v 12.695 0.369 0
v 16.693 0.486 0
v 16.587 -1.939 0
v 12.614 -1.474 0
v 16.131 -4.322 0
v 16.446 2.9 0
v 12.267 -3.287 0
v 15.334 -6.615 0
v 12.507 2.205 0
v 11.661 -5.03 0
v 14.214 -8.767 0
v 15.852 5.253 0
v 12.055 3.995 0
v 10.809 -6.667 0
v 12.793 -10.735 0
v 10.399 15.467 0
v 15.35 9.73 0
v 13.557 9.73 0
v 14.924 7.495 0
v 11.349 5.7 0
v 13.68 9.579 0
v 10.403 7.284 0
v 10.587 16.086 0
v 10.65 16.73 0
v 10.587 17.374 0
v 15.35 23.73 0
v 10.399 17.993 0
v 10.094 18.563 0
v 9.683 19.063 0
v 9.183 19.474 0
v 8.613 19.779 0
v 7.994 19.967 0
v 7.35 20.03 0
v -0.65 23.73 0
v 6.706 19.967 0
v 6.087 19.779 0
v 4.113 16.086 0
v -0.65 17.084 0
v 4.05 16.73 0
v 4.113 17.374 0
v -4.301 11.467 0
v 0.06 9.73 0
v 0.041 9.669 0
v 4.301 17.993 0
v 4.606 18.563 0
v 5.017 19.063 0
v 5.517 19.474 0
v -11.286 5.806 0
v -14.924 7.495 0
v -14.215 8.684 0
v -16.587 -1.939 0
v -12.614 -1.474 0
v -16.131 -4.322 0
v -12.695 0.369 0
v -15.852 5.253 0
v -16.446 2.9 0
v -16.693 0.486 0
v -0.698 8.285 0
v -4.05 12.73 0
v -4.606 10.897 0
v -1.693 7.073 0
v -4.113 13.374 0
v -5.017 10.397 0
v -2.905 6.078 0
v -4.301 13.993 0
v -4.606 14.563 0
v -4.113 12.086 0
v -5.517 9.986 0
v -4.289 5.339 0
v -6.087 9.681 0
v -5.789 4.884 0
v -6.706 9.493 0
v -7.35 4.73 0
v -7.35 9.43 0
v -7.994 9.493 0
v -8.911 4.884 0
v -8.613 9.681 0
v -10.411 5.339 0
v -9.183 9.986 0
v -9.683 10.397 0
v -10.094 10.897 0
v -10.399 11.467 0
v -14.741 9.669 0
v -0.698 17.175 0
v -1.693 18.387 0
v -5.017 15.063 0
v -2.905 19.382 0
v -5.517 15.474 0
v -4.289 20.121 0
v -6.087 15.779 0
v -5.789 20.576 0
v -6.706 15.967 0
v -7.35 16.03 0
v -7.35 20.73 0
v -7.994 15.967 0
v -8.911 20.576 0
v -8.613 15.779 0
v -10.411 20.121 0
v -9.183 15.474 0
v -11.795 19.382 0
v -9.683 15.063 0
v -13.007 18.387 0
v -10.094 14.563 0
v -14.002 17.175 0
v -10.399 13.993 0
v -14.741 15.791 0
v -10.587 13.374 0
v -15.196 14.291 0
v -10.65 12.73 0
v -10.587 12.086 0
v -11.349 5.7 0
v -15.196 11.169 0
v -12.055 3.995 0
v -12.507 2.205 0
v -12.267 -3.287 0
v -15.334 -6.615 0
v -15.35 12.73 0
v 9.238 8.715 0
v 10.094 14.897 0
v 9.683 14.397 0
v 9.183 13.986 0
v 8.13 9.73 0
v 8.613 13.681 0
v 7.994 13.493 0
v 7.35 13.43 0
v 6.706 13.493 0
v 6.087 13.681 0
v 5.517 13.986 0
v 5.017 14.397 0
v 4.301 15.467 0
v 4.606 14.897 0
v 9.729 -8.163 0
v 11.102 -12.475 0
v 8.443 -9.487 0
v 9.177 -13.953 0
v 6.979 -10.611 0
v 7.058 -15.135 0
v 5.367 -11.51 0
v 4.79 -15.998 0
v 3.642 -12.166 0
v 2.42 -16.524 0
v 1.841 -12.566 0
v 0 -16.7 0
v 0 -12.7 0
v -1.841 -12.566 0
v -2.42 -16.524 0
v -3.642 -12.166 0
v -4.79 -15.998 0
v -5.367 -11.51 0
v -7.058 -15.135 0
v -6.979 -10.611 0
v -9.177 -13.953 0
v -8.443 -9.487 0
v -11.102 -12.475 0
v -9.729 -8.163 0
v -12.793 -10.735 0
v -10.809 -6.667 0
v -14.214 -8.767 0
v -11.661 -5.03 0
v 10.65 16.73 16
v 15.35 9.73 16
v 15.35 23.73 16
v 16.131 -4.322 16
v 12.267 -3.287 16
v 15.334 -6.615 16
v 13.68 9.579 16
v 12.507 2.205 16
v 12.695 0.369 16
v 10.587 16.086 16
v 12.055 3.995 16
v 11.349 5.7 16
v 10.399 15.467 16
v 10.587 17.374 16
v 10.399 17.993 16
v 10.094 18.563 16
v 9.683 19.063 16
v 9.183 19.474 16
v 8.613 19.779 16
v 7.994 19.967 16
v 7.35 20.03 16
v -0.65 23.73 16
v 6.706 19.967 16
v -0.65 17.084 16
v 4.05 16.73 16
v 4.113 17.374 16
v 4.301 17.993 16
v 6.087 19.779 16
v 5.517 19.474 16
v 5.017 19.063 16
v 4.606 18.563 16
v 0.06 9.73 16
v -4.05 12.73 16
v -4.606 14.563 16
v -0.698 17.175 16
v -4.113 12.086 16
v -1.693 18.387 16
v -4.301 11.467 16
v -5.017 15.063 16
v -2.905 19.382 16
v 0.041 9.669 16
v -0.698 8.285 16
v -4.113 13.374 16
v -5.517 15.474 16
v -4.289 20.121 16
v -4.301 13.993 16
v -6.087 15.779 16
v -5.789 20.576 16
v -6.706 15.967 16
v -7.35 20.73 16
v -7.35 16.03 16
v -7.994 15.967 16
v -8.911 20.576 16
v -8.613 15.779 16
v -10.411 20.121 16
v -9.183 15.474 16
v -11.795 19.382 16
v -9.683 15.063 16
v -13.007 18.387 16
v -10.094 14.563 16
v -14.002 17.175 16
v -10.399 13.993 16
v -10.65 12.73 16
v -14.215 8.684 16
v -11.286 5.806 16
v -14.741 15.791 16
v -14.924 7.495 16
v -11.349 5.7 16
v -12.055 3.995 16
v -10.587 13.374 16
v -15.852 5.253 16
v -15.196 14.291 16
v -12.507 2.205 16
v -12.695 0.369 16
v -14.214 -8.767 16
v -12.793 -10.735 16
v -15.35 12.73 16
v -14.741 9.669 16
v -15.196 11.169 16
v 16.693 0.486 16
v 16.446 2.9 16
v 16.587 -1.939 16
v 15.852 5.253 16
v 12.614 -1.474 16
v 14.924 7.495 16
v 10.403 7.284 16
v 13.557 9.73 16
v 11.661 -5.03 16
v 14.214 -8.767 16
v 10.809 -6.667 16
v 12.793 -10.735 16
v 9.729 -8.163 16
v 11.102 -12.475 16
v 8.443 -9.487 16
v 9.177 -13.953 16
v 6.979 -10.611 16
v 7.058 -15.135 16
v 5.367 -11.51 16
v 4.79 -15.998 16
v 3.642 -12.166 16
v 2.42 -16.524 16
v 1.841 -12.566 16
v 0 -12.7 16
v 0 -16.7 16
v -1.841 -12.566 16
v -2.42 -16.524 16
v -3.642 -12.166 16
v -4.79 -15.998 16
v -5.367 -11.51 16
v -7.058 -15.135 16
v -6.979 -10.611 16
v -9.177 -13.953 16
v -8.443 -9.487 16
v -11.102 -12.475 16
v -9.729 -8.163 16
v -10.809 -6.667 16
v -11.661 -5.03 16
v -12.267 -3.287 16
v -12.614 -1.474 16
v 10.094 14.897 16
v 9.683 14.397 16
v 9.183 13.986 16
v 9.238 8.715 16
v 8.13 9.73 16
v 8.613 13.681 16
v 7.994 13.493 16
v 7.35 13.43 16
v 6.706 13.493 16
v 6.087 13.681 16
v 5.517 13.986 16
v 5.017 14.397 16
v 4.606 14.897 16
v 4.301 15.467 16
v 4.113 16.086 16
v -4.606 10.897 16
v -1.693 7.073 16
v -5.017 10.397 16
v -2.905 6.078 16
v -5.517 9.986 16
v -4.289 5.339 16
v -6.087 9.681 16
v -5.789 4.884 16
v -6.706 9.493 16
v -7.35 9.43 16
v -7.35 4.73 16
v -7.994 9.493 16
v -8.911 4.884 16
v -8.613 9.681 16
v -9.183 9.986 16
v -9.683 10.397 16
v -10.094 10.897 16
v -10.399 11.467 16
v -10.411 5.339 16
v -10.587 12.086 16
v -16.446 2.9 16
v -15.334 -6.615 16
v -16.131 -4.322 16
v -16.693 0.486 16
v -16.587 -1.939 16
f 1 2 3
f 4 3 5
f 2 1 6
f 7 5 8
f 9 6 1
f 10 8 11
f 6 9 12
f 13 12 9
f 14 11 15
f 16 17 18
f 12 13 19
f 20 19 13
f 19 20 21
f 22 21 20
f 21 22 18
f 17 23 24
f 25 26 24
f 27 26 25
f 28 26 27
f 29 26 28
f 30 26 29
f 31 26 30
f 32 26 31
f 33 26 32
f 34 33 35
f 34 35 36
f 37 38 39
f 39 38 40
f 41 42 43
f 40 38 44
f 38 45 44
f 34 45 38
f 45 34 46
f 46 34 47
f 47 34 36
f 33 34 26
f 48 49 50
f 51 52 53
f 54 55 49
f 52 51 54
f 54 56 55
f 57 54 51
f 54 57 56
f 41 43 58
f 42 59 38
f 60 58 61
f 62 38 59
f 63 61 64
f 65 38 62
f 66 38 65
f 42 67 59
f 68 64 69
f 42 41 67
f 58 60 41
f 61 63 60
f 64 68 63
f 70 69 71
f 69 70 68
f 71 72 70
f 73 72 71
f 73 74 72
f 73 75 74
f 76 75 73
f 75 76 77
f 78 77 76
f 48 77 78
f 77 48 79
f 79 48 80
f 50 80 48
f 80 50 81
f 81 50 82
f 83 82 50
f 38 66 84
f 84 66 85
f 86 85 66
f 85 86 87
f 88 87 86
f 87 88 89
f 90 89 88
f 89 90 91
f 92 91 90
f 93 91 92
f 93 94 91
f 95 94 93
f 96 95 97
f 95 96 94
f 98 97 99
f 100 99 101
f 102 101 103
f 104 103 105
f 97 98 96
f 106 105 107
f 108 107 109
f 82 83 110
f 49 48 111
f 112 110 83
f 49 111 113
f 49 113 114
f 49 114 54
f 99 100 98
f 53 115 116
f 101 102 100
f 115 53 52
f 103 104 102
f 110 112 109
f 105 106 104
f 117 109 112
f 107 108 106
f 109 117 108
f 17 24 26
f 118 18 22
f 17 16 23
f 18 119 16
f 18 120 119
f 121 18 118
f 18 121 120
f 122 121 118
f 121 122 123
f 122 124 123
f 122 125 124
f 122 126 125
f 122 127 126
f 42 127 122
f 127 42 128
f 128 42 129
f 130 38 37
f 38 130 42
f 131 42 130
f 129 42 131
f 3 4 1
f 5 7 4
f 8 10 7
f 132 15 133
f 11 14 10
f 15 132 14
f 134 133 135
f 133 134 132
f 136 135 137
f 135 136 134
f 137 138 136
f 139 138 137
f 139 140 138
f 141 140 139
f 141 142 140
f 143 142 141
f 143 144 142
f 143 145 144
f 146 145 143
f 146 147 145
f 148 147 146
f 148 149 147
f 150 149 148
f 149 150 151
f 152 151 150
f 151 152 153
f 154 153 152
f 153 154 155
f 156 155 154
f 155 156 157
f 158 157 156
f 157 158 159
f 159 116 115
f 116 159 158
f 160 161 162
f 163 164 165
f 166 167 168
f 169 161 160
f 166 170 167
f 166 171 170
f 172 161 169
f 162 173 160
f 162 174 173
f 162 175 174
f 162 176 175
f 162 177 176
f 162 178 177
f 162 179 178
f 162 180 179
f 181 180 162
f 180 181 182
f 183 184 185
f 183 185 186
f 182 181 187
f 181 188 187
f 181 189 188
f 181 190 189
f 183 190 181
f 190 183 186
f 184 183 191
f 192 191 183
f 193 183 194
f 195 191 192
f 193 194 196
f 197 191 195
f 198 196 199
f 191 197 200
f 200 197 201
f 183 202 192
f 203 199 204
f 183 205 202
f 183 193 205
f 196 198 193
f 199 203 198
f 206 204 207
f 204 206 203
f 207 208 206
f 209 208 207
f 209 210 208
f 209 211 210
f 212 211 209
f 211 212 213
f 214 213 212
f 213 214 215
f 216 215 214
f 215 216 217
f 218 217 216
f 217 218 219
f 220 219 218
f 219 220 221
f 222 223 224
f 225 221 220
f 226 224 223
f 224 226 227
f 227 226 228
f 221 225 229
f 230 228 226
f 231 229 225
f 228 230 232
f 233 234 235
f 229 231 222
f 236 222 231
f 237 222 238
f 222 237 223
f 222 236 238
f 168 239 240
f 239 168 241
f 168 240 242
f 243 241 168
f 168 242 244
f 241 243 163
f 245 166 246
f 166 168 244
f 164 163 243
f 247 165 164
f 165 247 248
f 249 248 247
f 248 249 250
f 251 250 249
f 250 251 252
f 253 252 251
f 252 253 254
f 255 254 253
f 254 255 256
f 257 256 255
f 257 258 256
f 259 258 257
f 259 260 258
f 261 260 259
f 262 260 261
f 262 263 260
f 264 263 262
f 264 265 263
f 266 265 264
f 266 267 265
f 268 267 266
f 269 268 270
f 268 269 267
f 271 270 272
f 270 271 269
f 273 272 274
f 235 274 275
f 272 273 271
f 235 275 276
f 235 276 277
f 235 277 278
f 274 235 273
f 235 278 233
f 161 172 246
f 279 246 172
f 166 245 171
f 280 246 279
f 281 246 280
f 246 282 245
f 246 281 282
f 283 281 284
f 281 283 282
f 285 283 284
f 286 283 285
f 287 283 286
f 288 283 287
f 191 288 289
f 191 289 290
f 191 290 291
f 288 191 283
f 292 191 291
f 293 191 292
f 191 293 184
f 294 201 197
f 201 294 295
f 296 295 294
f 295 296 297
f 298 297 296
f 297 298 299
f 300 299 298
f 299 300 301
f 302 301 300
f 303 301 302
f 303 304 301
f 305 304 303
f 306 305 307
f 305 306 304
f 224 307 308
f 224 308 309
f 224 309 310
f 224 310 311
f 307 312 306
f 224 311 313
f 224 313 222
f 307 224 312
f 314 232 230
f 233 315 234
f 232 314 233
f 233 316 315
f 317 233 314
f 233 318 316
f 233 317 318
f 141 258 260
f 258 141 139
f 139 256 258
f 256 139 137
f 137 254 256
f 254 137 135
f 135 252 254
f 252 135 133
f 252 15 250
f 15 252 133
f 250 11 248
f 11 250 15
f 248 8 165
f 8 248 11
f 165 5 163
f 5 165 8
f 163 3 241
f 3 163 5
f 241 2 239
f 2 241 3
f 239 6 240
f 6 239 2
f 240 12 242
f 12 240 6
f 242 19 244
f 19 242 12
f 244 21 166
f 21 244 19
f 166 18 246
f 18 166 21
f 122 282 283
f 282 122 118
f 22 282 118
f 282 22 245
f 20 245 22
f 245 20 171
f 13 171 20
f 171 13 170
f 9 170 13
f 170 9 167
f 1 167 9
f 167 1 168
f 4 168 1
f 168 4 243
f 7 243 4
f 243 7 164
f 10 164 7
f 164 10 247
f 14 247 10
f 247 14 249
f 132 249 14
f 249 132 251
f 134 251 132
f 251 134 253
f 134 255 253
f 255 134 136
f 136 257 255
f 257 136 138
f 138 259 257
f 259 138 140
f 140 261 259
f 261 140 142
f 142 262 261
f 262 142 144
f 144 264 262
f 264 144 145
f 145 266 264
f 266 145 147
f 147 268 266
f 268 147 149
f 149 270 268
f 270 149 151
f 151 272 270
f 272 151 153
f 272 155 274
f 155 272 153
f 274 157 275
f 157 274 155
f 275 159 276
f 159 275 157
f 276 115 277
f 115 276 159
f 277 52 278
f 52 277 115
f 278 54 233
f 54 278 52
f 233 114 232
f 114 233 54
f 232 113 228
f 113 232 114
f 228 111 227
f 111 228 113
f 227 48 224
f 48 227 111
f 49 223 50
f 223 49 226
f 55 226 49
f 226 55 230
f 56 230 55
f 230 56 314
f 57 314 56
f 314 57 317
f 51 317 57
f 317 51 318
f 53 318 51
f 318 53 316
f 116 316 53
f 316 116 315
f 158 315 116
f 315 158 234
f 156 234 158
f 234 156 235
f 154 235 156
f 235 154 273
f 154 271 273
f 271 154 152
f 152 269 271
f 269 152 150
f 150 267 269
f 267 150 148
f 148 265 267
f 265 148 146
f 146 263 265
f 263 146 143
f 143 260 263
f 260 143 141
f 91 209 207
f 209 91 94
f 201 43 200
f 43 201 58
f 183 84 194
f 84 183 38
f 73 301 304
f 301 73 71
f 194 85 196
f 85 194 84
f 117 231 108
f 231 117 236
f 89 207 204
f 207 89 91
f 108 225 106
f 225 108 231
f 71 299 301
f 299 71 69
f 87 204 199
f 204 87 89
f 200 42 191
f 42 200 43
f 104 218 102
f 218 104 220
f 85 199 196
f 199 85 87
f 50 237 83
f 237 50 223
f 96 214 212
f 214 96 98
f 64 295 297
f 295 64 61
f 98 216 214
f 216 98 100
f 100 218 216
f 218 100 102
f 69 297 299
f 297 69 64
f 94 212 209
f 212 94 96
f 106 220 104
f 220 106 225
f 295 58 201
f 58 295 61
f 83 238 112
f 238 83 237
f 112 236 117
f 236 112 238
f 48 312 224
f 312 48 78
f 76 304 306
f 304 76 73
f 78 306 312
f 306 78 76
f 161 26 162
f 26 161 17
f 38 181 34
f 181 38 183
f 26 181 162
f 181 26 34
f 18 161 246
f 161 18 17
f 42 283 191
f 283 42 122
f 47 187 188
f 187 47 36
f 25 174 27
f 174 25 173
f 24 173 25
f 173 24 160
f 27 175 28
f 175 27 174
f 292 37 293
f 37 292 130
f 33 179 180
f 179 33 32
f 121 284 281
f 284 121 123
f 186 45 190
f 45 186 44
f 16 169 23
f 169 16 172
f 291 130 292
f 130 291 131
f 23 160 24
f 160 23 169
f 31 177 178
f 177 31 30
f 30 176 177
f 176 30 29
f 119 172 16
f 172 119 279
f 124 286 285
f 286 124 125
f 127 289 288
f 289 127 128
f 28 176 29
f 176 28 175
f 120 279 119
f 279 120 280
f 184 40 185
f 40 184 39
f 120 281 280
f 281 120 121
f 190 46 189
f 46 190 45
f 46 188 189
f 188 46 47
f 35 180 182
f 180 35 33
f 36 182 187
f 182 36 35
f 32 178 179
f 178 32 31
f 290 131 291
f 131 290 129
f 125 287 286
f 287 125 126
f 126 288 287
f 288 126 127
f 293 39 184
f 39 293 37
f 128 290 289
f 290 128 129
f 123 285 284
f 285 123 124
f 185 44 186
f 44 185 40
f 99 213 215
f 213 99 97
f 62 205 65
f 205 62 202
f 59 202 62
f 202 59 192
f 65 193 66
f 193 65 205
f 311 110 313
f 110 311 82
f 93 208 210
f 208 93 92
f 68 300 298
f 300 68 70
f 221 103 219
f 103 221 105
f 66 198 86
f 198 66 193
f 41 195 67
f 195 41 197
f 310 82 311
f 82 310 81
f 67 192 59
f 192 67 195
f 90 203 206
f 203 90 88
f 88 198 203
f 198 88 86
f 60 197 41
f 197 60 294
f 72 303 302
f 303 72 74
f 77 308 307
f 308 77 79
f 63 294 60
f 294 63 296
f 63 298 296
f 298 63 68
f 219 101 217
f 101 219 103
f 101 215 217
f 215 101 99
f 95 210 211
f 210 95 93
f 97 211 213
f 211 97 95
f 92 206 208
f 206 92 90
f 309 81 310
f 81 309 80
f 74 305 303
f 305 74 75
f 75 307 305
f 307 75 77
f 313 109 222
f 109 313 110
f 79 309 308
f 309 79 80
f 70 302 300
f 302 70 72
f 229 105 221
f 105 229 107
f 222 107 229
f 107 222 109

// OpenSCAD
$fn = 32;

// ----------------------------------------------------------------------
// Pipe clamp: 33.4 mm ring, 4 mm wall, 16 mm wide
// ----------------------------------------------------------------------

// --- parameters (mm) ---
outer_r = 16.7;           // clamp outside radius
inner_r = 12.7;           // pipe bore radius
band = 4;                 // band thickness
clamp_w = 16;             // clamp width
opening = 60;             // opening angle between the ends
lug_w = 16;               // lug width
lug_len = 14;             // lug length
bolt_d = 6.6;             // bolt hole
knuckle_d = 16;           // hinge knuckle diameter
pin_d = 6.6;              // hinge pin hole

clamp_profile = [[-8.35, 14.463], [-10.358, 13.1], [-12.147, 11.46], [-13.68, 9.579], [-14.924, 7.495], [-15.852, 5.253], [-16.446, 2.9], [-16.693, 0.486], [-16.587, -1.939], [-16.131, -4.322], [-15.334, -6.615], [-14.214, -8.767], [-12.793, -10.735], [-11.102, -12.475], [-9.177, -13.953], [-7.058, -15.135], [-4.79, -15.998], [-2.42, -16.524], [0, -16.7], [2.42, -16.524], [4.79, -15.998], [7.058, -15.135], [9.177, -13.953], [11.102, -12.475], [12.793, -10.735], [14.214, -8.767], [15.334, -6.615], [16.131, -4.322], [16.587, -1.939], [16.693, 0.486], [16.446, 2.9], [15.852, 5.253], [14.924, 7.495], [13.68, 9.579], [12.147, 11.46], [10.358, 13.1], [8.35, 14.463], [6.35, 10.999], [7.877, 9.962], [9.238, 8.715], [10.403, 7.284], [11.349, 5.7], [12.055, 3.995], [12.507, 2.205], [12.695, 0.369], [12.614, -1.474], [12.267, -3.287], [11.661, -5.03], [10.809, -6.667], [9.729, -8.163], [8.443, -9.487], [6.979, -10.611], [5.367, -11.51], [3.642, -12.166], [1.841, -12.566], [0, -12.7], [-1.841, -12.566], [-3.642, -12.166], [-5.367, -11.51], [-6.979, -10.611], [-8.443, -9.487], [-9.729, -8.163], [-10.809, -6.667], [-11.661, -5.03], [-12.267, -3.287], [-12.614, -1.474], [-12.695, 0.369], [-12.507, 2.205], [-12.055, 3.995], [-11.349, 5.7], [-10.403, 7.284], [-9.238, 8.715], [-7.877, 9.962], [-6.35, 10.999]];

difference() {
  union() {
    linear_extrude(height = clamp_w) polygon(clamp_profile);
    /* hinge knuckle, sunk 2 mm into the band end */
    translate([-7.35, 12.73, 0]) cylinder(h = clamp_w, d = knuckle_d);
    /* bolt lug on the other end */
    translate([-0.65, 9.73, 0]) cube([lug_w, 14, clamp_w]);
  }
  translate([7.35, 16.73, -2.5]) cylinder(h = clamp_w + 5, d = bolt_d);
  translate([-7.35, 12.73, -2.5]) cylinder(h = clamp_w + 5, d = pin_d);
}
